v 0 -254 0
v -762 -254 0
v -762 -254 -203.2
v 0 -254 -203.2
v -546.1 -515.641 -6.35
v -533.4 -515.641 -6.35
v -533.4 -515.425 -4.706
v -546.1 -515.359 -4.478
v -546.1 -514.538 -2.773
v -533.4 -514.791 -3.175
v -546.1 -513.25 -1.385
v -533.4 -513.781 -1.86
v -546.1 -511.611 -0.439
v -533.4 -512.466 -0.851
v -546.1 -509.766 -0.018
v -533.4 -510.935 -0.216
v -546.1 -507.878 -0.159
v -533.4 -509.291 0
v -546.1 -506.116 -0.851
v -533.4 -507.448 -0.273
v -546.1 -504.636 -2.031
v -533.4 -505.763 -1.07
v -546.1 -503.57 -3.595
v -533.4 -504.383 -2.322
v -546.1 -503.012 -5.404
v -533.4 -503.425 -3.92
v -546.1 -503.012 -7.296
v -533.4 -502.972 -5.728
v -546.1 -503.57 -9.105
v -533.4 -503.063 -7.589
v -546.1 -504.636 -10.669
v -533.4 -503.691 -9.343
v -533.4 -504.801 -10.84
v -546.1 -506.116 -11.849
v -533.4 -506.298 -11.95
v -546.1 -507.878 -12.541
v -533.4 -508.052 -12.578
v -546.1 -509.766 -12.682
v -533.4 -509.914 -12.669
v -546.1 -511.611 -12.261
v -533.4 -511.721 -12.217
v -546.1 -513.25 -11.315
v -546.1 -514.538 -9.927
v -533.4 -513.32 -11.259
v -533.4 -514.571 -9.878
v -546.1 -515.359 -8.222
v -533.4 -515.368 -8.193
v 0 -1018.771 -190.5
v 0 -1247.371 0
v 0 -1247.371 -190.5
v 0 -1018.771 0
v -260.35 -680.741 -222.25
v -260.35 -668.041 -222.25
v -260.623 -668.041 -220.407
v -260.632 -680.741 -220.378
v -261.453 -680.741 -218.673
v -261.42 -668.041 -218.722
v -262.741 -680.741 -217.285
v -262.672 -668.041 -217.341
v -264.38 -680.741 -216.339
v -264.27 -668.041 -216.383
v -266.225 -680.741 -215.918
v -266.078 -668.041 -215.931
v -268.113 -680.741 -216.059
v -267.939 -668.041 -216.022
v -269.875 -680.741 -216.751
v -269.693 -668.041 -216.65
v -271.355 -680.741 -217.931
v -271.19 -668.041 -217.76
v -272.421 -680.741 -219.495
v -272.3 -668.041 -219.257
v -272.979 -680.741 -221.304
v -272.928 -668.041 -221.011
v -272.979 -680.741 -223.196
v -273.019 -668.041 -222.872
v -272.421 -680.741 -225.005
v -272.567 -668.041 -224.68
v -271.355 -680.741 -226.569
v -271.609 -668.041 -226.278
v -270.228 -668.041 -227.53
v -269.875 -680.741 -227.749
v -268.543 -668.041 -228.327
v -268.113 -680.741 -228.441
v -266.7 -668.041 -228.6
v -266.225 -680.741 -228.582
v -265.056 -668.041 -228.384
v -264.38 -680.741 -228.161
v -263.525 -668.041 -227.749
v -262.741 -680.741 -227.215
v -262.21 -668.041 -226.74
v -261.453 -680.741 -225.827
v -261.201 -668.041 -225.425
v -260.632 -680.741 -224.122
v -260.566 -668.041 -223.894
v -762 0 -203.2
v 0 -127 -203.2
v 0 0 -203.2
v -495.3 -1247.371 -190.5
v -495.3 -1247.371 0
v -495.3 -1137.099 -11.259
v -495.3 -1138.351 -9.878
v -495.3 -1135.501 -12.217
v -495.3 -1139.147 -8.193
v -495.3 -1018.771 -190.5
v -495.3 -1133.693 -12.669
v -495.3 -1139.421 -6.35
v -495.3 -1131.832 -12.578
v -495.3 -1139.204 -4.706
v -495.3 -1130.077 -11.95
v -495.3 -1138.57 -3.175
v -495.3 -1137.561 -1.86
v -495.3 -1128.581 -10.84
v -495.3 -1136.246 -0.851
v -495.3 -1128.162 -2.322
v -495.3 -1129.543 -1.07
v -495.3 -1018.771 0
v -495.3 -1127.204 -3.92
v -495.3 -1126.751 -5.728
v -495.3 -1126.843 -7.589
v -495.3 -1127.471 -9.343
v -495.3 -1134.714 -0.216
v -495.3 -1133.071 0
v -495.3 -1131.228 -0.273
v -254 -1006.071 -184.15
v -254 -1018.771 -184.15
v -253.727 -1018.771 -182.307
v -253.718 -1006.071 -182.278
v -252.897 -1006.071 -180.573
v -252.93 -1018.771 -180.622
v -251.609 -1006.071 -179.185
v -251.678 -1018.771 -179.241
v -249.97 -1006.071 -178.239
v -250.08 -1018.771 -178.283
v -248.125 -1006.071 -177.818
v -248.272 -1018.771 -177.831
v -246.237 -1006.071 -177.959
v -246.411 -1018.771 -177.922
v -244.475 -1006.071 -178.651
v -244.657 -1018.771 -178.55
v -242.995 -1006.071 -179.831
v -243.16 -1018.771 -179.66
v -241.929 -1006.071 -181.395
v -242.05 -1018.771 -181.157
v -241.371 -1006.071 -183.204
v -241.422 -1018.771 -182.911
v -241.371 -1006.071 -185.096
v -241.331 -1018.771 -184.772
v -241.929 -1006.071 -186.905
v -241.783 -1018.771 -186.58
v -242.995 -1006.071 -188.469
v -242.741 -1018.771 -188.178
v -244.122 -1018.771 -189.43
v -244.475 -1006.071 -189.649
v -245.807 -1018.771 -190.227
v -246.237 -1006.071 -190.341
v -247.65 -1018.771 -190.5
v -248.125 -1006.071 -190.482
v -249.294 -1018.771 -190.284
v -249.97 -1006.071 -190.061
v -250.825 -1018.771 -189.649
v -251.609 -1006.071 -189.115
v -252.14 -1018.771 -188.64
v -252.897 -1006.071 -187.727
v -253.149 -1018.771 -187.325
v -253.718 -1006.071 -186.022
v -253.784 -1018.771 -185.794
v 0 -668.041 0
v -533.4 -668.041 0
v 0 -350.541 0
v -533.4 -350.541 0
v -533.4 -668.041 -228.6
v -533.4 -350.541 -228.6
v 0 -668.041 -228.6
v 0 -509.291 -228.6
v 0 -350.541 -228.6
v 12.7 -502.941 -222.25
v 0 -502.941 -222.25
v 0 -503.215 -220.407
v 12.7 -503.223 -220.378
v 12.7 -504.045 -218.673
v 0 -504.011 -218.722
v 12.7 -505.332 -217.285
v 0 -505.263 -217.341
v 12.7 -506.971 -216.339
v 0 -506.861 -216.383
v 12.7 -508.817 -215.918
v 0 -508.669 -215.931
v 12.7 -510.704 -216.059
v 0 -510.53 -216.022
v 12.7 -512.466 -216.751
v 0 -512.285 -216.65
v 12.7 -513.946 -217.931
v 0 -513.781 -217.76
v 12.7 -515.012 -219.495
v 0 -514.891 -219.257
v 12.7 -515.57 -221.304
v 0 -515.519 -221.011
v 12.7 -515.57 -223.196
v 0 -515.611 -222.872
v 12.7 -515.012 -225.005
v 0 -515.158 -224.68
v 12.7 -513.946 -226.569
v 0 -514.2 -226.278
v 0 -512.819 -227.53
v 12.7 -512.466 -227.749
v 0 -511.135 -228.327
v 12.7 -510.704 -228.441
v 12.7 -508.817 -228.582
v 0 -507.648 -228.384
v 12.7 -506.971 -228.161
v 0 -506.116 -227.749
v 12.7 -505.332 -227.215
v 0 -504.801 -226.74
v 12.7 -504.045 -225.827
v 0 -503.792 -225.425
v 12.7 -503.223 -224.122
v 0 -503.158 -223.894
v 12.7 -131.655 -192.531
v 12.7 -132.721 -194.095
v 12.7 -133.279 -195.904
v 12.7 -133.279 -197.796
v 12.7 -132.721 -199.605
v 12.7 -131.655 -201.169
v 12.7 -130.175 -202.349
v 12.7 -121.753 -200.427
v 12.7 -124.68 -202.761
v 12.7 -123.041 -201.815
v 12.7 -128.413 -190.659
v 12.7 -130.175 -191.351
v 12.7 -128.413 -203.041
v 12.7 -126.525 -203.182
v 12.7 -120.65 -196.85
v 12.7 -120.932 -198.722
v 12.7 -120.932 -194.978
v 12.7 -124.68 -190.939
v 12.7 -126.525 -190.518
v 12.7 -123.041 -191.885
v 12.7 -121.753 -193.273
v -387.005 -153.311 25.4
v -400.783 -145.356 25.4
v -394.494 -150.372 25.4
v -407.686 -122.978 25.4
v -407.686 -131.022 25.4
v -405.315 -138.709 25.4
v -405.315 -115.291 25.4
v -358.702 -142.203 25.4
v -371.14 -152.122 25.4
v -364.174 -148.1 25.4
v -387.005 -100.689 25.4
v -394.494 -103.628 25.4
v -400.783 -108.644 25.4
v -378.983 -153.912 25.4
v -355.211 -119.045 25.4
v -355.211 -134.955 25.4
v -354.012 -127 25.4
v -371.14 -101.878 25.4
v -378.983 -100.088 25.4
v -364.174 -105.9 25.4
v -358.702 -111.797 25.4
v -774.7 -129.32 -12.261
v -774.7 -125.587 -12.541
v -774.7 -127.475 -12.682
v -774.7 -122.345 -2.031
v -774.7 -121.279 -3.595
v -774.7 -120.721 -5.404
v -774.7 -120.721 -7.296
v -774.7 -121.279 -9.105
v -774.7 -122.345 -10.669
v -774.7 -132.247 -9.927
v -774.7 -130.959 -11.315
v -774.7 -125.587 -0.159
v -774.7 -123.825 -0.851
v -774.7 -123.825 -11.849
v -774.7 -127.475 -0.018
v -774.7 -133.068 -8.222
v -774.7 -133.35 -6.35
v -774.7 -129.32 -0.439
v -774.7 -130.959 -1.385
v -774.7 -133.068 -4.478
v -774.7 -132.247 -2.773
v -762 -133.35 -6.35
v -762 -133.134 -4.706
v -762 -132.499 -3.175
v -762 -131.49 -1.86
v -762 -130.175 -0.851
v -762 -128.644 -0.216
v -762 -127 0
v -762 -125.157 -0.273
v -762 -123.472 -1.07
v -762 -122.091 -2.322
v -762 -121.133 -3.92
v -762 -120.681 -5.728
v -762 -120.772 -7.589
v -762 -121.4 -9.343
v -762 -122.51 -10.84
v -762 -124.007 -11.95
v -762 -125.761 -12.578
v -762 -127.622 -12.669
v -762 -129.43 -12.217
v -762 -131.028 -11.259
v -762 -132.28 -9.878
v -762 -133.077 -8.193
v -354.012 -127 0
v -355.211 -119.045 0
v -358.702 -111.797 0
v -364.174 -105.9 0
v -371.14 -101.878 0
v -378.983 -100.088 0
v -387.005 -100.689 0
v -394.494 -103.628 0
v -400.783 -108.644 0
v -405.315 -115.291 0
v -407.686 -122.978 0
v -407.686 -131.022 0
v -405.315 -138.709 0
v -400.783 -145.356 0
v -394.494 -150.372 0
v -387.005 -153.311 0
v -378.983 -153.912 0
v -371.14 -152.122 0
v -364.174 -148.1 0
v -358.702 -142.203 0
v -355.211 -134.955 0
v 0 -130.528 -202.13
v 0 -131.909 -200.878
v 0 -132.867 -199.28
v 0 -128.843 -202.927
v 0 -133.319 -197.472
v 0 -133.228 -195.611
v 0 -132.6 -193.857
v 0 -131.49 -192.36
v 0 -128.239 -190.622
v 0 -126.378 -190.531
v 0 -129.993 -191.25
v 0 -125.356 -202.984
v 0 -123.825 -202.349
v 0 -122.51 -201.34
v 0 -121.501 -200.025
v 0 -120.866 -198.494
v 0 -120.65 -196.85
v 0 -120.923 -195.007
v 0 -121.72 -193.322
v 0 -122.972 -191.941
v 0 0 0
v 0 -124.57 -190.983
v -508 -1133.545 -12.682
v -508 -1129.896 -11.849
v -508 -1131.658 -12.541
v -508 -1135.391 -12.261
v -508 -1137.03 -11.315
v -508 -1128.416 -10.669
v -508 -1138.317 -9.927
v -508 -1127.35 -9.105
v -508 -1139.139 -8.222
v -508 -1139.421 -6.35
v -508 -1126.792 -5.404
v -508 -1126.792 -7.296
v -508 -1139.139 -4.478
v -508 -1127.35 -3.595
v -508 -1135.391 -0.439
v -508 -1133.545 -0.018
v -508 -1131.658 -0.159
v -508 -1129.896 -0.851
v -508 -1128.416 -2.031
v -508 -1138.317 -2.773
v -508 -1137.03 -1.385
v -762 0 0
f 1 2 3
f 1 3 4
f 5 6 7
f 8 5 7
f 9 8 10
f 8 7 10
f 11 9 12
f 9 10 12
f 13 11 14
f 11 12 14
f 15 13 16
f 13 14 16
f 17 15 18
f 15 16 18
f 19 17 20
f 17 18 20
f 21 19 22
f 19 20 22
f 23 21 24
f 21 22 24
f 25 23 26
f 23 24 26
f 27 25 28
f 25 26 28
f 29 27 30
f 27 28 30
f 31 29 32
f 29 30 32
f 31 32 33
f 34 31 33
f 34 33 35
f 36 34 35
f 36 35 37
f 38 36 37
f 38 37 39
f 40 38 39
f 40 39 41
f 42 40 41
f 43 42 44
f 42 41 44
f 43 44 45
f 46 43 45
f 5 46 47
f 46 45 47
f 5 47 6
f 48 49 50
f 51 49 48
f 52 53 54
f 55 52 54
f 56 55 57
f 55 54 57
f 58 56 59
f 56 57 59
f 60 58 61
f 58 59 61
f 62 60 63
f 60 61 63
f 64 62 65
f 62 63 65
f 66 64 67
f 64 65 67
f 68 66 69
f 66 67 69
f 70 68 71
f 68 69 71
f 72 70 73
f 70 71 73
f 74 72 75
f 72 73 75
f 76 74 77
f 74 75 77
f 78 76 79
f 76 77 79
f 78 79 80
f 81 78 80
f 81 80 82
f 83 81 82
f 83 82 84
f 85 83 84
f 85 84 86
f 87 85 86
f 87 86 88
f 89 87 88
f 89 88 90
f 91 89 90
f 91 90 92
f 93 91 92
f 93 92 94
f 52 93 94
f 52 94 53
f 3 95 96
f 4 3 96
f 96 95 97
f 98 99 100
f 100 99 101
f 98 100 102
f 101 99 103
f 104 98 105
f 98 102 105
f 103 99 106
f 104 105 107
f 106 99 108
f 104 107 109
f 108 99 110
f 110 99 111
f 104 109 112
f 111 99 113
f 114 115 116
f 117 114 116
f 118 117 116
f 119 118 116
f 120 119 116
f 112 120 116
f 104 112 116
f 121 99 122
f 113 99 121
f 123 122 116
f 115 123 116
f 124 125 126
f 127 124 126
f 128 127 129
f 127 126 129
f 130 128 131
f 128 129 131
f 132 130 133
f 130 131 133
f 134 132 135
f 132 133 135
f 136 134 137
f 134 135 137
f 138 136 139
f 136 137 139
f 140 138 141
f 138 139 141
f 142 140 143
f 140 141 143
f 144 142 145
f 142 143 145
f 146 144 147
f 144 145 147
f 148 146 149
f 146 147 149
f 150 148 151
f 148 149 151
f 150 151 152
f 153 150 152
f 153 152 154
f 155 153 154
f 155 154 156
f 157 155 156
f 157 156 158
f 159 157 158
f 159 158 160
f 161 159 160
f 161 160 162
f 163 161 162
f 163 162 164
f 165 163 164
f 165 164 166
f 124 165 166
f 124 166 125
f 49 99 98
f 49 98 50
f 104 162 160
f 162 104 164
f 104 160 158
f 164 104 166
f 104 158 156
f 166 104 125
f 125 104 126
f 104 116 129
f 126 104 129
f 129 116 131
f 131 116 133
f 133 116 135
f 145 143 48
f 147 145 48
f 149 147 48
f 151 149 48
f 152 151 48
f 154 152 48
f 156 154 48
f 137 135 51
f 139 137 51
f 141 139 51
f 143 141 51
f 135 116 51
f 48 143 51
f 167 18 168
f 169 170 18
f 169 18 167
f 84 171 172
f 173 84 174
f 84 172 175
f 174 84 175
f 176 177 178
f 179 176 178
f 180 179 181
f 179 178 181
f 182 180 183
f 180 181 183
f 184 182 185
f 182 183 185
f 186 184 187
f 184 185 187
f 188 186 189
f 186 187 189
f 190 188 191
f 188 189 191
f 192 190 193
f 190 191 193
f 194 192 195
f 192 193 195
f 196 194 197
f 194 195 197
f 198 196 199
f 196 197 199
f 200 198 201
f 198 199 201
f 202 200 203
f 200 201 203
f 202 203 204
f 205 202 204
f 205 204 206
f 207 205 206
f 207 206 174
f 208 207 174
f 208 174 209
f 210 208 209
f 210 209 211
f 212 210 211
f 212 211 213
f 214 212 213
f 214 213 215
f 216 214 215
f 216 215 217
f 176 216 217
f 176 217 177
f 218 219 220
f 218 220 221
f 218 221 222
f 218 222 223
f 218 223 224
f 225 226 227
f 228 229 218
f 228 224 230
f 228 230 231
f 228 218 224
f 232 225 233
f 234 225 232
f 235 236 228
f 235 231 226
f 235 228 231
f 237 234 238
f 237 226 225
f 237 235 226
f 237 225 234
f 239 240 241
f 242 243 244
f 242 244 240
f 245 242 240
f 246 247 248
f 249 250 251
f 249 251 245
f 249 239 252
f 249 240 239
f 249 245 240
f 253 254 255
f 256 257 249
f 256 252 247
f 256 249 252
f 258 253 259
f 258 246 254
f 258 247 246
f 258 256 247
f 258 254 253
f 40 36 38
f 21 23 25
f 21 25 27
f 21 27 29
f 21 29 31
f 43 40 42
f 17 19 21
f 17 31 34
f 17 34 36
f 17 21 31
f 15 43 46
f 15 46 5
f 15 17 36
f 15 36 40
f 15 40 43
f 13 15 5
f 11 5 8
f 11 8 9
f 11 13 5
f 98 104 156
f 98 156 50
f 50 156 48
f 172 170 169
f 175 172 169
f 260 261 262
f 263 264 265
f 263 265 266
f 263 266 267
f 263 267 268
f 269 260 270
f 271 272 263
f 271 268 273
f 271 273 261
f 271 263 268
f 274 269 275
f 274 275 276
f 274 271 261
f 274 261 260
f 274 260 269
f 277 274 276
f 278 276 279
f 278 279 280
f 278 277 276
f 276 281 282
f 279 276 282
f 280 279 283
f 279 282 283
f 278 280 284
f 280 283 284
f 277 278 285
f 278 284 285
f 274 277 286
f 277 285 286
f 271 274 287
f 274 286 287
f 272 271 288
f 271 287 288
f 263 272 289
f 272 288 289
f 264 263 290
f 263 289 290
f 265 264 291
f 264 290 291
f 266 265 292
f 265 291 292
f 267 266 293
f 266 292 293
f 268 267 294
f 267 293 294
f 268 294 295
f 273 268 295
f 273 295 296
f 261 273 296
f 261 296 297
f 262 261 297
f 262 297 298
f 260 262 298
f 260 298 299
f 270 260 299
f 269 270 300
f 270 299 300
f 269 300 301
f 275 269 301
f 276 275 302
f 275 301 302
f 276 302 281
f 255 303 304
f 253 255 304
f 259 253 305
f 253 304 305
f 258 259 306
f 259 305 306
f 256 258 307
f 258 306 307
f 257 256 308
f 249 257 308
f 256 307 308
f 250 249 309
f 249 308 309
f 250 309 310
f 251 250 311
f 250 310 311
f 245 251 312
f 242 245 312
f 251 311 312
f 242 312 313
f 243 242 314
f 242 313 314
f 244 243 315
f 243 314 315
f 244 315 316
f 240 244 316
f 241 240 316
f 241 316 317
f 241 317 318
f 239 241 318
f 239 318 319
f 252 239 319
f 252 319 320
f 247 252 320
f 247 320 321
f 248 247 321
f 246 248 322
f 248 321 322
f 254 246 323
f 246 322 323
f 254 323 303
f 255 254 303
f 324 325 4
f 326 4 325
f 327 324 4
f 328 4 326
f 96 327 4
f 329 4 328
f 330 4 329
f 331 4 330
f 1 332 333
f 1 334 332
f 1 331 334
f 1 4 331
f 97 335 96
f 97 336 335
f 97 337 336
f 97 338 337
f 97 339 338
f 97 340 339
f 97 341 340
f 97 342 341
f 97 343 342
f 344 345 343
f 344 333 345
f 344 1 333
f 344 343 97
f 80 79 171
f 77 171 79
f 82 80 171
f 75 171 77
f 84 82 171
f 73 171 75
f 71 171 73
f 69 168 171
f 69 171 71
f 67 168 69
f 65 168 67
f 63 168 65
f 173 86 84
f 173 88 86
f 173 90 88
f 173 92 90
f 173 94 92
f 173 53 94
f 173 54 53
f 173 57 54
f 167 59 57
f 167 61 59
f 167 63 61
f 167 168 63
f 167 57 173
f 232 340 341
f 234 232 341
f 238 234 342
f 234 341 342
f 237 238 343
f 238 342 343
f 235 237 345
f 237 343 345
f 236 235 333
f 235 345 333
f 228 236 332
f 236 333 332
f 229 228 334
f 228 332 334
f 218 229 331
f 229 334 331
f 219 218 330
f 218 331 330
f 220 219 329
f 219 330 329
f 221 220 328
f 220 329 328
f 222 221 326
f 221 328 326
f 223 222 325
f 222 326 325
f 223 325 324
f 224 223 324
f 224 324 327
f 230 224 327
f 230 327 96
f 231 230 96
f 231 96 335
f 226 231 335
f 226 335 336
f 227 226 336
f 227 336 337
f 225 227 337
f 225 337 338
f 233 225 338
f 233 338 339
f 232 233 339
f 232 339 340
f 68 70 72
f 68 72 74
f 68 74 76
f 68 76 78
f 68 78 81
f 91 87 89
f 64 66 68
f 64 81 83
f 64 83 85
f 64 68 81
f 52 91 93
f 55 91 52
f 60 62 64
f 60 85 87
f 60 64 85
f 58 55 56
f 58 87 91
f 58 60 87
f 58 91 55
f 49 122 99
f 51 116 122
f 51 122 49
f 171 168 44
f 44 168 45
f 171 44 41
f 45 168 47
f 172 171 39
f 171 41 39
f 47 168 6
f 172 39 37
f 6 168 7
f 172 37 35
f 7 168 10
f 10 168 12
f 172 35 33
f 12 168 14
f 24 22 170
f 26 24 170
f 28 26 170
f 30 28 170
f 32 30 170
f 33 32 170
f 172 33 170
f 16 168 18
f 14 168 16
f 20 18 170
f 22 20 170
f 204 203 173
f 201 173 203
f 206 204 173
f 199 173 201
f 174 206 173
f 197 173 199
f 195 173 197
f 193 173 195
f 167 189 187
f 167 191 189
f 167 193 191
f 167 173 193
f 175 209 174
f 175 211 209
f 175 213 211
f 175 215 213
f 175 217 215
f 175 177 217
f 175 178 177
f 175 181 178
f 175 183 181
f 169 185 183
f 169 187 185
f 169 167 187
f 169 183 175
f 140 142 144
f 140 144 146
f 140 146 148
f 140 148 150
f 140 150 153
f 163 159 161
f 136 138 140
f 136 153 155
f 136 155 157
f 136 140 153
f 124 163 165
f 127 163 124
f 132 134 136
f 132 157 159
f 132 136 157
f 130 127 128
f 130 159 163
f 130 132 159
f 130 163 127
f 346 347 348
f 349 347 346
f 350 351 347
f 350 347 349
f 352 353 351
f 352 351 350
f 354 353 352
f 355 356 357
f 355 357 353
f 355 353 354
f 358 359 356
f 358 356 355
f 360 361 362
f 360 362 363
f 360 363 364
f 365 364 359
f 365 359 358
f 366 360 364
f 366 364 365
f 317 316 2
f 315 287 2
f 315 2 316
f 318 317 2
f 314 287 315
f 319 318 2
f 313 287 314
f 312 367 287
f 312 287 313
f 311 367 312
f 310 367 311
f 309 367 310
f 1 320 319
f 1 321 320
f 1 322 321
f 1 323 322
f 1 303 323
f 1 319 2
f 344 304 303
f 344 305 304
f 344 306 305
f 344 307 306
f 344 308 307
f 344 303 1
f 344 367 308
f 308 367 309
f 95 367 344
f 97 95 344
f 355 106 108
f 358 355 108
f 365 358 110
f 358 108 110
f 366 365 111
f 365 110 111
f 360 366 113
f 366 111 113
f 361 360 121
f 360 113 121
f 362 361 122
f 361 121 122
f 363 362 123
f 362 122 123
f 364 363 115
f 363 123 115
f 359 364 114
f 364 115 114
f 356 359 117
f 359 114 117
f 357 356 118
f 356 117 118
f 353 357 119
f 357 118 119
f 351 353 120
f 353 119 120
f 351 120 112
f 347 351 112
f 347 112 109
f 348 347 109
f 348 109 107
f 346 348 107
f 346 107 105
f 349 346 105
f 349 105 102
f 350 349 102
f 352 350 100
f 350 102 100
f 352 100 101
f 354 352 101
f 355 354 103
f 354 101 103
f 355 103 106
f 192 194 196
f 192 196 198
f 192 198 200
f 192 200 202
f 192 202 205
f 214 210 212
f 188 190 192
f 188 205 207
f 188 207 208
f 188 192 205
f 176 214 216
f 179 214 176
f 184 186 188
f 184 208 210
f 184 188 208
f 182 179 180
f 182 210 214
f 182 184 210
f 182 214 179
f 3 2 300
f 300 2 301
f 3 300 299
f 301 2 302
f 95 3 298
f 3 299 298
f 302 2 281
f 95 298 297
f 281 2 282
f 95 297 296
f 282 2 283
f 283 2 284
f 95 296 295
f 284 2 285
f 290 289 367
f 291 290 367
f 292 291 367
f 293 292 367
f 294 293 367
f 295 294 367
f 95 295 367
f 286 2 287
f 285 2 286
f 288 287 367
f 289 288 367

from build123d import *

# Parameters (mm, degrees)
F0_W      = 762
F0_H      = 254
F1_DEPTH  = 203.2
F2_R      = 6.35
F3_DEPTH  = 12.7
F4_R      = 6.35
F5_DEPTH  = 12.7
F6_W      = 533.4
F6_H      = 317.5
F7_DEPTH  = 228.6
F8_R      = 6.35
F9_DEPTH  = 12.7
F10_R     = 6.35
F11_DEPTH = 12.7
F12_R     = 6.35
F13_DEPTH = 12.7
F14_W     = 495.3
F14_H     = 228.6
F15_DEPTH = 190.5
F16_R     = 6.35
F17_DEPTH = 12.7
F18_R     = 6.35
F19_DEPTH = 12.7
F20_R     = 26.9875
F21_DEPTH = 25.4


with BuildPart() as f1:
    # F0 (on Top) → F1 (new body)
    with BuildSketch(Plane.XY):
        with Locations((-381, -127)):
            Rectangle(F0_W, F0_H)
    extrude(amount=-F1_DEPTH)

    # F2 (on face) → F3 (join)
    with BuildSketch(Plane(origin=(-762, 0, 0), x_dir=(0, -1, 0), z_dir=(-1, 0, 0))):
        with Locations((127, -6.35)):
            Circle(F2_R)
    extrude(amount=F3_DEPTH)

    # F4 (on face) → F5 (join)
    with BuildSketch(Plane.YZ):
        with Locations((-127, -196.85)):
            Circle(F4_R)
    extrude(amount=F5_DEPTH)

    # F20 (on face) → F21 (join)
    with BuildSketch(Plane.XY):
        with Locations((-381, -127)):
            Circle(F20_R)
    extrude(amount=F21_DEPTH)


with BuildPart() as f7:
    # F6 (on Top) → F7 (new body)
    with BuildSketch(Plane.XY):
        with Locations((-266.7, -509.291289)):
            Rectangle(F6_W, F6_H)
    extrude(amount=-F7_DEPTH)

    # F8 (on face) → F9 (join)
    with BuildSketch(Plane(origin=(-533.4, 0, 0), x_dir=(0, -1, 0), z_dir=(-1, 0, 0))):
        with Locations((509.291289, -6.35)):
            Circle(F8_R)
    extrude(amount=F9_DEPTH)

    # F10 (on face) → F11 (join)
    with BuildSketch(Plane.YZ):
        with Locations((-509.291289, -222.25)):
            Circle(F10_R)
    extrude(amount=F11_DEPTH)

    # F12 (on face) → F13 (join)
    with BuildSketch(Plane.XZ.offset(668.041289)):
        with Locations((-266.7, -222.25)):
            Circle(F12_R)
    extrude(amount=F13_DEPTH)


with BuildPart() as f15:
    # F14 (on Top) → F15 (new body)
    with BuildSketch(Plane.XY):
        with Locations((-247.65, -1133.070839)):
            Rectangle(F14_W, F14_H)
    extrude(amount=-F15_DEPTH)

    # F16 (on face) → F17 (join)
    with BuildSketch(Plane(origin=(-495.3, 0, 0), x_dir=(0, -1, 0), z_dir=(-1, 0, 0))):
        with Locations((1133.070839, -6.35)):
            Circle(F16_R)
    extrude(amount=F17_DEPTH)

    # F18 (on face) → F19 (join)
    with BuildSketch(Plane(origin=(0, -1018.770839, 0), x_dir=(-1, 0, 0), z_dir=(0, 1, 0))):
        with Locations((247.65, -184.15)):
            Circle(F18_R)
    extrude(amount=F19_DEPTH)


solid = Compound([f1.part, f7.part, f15.part])
